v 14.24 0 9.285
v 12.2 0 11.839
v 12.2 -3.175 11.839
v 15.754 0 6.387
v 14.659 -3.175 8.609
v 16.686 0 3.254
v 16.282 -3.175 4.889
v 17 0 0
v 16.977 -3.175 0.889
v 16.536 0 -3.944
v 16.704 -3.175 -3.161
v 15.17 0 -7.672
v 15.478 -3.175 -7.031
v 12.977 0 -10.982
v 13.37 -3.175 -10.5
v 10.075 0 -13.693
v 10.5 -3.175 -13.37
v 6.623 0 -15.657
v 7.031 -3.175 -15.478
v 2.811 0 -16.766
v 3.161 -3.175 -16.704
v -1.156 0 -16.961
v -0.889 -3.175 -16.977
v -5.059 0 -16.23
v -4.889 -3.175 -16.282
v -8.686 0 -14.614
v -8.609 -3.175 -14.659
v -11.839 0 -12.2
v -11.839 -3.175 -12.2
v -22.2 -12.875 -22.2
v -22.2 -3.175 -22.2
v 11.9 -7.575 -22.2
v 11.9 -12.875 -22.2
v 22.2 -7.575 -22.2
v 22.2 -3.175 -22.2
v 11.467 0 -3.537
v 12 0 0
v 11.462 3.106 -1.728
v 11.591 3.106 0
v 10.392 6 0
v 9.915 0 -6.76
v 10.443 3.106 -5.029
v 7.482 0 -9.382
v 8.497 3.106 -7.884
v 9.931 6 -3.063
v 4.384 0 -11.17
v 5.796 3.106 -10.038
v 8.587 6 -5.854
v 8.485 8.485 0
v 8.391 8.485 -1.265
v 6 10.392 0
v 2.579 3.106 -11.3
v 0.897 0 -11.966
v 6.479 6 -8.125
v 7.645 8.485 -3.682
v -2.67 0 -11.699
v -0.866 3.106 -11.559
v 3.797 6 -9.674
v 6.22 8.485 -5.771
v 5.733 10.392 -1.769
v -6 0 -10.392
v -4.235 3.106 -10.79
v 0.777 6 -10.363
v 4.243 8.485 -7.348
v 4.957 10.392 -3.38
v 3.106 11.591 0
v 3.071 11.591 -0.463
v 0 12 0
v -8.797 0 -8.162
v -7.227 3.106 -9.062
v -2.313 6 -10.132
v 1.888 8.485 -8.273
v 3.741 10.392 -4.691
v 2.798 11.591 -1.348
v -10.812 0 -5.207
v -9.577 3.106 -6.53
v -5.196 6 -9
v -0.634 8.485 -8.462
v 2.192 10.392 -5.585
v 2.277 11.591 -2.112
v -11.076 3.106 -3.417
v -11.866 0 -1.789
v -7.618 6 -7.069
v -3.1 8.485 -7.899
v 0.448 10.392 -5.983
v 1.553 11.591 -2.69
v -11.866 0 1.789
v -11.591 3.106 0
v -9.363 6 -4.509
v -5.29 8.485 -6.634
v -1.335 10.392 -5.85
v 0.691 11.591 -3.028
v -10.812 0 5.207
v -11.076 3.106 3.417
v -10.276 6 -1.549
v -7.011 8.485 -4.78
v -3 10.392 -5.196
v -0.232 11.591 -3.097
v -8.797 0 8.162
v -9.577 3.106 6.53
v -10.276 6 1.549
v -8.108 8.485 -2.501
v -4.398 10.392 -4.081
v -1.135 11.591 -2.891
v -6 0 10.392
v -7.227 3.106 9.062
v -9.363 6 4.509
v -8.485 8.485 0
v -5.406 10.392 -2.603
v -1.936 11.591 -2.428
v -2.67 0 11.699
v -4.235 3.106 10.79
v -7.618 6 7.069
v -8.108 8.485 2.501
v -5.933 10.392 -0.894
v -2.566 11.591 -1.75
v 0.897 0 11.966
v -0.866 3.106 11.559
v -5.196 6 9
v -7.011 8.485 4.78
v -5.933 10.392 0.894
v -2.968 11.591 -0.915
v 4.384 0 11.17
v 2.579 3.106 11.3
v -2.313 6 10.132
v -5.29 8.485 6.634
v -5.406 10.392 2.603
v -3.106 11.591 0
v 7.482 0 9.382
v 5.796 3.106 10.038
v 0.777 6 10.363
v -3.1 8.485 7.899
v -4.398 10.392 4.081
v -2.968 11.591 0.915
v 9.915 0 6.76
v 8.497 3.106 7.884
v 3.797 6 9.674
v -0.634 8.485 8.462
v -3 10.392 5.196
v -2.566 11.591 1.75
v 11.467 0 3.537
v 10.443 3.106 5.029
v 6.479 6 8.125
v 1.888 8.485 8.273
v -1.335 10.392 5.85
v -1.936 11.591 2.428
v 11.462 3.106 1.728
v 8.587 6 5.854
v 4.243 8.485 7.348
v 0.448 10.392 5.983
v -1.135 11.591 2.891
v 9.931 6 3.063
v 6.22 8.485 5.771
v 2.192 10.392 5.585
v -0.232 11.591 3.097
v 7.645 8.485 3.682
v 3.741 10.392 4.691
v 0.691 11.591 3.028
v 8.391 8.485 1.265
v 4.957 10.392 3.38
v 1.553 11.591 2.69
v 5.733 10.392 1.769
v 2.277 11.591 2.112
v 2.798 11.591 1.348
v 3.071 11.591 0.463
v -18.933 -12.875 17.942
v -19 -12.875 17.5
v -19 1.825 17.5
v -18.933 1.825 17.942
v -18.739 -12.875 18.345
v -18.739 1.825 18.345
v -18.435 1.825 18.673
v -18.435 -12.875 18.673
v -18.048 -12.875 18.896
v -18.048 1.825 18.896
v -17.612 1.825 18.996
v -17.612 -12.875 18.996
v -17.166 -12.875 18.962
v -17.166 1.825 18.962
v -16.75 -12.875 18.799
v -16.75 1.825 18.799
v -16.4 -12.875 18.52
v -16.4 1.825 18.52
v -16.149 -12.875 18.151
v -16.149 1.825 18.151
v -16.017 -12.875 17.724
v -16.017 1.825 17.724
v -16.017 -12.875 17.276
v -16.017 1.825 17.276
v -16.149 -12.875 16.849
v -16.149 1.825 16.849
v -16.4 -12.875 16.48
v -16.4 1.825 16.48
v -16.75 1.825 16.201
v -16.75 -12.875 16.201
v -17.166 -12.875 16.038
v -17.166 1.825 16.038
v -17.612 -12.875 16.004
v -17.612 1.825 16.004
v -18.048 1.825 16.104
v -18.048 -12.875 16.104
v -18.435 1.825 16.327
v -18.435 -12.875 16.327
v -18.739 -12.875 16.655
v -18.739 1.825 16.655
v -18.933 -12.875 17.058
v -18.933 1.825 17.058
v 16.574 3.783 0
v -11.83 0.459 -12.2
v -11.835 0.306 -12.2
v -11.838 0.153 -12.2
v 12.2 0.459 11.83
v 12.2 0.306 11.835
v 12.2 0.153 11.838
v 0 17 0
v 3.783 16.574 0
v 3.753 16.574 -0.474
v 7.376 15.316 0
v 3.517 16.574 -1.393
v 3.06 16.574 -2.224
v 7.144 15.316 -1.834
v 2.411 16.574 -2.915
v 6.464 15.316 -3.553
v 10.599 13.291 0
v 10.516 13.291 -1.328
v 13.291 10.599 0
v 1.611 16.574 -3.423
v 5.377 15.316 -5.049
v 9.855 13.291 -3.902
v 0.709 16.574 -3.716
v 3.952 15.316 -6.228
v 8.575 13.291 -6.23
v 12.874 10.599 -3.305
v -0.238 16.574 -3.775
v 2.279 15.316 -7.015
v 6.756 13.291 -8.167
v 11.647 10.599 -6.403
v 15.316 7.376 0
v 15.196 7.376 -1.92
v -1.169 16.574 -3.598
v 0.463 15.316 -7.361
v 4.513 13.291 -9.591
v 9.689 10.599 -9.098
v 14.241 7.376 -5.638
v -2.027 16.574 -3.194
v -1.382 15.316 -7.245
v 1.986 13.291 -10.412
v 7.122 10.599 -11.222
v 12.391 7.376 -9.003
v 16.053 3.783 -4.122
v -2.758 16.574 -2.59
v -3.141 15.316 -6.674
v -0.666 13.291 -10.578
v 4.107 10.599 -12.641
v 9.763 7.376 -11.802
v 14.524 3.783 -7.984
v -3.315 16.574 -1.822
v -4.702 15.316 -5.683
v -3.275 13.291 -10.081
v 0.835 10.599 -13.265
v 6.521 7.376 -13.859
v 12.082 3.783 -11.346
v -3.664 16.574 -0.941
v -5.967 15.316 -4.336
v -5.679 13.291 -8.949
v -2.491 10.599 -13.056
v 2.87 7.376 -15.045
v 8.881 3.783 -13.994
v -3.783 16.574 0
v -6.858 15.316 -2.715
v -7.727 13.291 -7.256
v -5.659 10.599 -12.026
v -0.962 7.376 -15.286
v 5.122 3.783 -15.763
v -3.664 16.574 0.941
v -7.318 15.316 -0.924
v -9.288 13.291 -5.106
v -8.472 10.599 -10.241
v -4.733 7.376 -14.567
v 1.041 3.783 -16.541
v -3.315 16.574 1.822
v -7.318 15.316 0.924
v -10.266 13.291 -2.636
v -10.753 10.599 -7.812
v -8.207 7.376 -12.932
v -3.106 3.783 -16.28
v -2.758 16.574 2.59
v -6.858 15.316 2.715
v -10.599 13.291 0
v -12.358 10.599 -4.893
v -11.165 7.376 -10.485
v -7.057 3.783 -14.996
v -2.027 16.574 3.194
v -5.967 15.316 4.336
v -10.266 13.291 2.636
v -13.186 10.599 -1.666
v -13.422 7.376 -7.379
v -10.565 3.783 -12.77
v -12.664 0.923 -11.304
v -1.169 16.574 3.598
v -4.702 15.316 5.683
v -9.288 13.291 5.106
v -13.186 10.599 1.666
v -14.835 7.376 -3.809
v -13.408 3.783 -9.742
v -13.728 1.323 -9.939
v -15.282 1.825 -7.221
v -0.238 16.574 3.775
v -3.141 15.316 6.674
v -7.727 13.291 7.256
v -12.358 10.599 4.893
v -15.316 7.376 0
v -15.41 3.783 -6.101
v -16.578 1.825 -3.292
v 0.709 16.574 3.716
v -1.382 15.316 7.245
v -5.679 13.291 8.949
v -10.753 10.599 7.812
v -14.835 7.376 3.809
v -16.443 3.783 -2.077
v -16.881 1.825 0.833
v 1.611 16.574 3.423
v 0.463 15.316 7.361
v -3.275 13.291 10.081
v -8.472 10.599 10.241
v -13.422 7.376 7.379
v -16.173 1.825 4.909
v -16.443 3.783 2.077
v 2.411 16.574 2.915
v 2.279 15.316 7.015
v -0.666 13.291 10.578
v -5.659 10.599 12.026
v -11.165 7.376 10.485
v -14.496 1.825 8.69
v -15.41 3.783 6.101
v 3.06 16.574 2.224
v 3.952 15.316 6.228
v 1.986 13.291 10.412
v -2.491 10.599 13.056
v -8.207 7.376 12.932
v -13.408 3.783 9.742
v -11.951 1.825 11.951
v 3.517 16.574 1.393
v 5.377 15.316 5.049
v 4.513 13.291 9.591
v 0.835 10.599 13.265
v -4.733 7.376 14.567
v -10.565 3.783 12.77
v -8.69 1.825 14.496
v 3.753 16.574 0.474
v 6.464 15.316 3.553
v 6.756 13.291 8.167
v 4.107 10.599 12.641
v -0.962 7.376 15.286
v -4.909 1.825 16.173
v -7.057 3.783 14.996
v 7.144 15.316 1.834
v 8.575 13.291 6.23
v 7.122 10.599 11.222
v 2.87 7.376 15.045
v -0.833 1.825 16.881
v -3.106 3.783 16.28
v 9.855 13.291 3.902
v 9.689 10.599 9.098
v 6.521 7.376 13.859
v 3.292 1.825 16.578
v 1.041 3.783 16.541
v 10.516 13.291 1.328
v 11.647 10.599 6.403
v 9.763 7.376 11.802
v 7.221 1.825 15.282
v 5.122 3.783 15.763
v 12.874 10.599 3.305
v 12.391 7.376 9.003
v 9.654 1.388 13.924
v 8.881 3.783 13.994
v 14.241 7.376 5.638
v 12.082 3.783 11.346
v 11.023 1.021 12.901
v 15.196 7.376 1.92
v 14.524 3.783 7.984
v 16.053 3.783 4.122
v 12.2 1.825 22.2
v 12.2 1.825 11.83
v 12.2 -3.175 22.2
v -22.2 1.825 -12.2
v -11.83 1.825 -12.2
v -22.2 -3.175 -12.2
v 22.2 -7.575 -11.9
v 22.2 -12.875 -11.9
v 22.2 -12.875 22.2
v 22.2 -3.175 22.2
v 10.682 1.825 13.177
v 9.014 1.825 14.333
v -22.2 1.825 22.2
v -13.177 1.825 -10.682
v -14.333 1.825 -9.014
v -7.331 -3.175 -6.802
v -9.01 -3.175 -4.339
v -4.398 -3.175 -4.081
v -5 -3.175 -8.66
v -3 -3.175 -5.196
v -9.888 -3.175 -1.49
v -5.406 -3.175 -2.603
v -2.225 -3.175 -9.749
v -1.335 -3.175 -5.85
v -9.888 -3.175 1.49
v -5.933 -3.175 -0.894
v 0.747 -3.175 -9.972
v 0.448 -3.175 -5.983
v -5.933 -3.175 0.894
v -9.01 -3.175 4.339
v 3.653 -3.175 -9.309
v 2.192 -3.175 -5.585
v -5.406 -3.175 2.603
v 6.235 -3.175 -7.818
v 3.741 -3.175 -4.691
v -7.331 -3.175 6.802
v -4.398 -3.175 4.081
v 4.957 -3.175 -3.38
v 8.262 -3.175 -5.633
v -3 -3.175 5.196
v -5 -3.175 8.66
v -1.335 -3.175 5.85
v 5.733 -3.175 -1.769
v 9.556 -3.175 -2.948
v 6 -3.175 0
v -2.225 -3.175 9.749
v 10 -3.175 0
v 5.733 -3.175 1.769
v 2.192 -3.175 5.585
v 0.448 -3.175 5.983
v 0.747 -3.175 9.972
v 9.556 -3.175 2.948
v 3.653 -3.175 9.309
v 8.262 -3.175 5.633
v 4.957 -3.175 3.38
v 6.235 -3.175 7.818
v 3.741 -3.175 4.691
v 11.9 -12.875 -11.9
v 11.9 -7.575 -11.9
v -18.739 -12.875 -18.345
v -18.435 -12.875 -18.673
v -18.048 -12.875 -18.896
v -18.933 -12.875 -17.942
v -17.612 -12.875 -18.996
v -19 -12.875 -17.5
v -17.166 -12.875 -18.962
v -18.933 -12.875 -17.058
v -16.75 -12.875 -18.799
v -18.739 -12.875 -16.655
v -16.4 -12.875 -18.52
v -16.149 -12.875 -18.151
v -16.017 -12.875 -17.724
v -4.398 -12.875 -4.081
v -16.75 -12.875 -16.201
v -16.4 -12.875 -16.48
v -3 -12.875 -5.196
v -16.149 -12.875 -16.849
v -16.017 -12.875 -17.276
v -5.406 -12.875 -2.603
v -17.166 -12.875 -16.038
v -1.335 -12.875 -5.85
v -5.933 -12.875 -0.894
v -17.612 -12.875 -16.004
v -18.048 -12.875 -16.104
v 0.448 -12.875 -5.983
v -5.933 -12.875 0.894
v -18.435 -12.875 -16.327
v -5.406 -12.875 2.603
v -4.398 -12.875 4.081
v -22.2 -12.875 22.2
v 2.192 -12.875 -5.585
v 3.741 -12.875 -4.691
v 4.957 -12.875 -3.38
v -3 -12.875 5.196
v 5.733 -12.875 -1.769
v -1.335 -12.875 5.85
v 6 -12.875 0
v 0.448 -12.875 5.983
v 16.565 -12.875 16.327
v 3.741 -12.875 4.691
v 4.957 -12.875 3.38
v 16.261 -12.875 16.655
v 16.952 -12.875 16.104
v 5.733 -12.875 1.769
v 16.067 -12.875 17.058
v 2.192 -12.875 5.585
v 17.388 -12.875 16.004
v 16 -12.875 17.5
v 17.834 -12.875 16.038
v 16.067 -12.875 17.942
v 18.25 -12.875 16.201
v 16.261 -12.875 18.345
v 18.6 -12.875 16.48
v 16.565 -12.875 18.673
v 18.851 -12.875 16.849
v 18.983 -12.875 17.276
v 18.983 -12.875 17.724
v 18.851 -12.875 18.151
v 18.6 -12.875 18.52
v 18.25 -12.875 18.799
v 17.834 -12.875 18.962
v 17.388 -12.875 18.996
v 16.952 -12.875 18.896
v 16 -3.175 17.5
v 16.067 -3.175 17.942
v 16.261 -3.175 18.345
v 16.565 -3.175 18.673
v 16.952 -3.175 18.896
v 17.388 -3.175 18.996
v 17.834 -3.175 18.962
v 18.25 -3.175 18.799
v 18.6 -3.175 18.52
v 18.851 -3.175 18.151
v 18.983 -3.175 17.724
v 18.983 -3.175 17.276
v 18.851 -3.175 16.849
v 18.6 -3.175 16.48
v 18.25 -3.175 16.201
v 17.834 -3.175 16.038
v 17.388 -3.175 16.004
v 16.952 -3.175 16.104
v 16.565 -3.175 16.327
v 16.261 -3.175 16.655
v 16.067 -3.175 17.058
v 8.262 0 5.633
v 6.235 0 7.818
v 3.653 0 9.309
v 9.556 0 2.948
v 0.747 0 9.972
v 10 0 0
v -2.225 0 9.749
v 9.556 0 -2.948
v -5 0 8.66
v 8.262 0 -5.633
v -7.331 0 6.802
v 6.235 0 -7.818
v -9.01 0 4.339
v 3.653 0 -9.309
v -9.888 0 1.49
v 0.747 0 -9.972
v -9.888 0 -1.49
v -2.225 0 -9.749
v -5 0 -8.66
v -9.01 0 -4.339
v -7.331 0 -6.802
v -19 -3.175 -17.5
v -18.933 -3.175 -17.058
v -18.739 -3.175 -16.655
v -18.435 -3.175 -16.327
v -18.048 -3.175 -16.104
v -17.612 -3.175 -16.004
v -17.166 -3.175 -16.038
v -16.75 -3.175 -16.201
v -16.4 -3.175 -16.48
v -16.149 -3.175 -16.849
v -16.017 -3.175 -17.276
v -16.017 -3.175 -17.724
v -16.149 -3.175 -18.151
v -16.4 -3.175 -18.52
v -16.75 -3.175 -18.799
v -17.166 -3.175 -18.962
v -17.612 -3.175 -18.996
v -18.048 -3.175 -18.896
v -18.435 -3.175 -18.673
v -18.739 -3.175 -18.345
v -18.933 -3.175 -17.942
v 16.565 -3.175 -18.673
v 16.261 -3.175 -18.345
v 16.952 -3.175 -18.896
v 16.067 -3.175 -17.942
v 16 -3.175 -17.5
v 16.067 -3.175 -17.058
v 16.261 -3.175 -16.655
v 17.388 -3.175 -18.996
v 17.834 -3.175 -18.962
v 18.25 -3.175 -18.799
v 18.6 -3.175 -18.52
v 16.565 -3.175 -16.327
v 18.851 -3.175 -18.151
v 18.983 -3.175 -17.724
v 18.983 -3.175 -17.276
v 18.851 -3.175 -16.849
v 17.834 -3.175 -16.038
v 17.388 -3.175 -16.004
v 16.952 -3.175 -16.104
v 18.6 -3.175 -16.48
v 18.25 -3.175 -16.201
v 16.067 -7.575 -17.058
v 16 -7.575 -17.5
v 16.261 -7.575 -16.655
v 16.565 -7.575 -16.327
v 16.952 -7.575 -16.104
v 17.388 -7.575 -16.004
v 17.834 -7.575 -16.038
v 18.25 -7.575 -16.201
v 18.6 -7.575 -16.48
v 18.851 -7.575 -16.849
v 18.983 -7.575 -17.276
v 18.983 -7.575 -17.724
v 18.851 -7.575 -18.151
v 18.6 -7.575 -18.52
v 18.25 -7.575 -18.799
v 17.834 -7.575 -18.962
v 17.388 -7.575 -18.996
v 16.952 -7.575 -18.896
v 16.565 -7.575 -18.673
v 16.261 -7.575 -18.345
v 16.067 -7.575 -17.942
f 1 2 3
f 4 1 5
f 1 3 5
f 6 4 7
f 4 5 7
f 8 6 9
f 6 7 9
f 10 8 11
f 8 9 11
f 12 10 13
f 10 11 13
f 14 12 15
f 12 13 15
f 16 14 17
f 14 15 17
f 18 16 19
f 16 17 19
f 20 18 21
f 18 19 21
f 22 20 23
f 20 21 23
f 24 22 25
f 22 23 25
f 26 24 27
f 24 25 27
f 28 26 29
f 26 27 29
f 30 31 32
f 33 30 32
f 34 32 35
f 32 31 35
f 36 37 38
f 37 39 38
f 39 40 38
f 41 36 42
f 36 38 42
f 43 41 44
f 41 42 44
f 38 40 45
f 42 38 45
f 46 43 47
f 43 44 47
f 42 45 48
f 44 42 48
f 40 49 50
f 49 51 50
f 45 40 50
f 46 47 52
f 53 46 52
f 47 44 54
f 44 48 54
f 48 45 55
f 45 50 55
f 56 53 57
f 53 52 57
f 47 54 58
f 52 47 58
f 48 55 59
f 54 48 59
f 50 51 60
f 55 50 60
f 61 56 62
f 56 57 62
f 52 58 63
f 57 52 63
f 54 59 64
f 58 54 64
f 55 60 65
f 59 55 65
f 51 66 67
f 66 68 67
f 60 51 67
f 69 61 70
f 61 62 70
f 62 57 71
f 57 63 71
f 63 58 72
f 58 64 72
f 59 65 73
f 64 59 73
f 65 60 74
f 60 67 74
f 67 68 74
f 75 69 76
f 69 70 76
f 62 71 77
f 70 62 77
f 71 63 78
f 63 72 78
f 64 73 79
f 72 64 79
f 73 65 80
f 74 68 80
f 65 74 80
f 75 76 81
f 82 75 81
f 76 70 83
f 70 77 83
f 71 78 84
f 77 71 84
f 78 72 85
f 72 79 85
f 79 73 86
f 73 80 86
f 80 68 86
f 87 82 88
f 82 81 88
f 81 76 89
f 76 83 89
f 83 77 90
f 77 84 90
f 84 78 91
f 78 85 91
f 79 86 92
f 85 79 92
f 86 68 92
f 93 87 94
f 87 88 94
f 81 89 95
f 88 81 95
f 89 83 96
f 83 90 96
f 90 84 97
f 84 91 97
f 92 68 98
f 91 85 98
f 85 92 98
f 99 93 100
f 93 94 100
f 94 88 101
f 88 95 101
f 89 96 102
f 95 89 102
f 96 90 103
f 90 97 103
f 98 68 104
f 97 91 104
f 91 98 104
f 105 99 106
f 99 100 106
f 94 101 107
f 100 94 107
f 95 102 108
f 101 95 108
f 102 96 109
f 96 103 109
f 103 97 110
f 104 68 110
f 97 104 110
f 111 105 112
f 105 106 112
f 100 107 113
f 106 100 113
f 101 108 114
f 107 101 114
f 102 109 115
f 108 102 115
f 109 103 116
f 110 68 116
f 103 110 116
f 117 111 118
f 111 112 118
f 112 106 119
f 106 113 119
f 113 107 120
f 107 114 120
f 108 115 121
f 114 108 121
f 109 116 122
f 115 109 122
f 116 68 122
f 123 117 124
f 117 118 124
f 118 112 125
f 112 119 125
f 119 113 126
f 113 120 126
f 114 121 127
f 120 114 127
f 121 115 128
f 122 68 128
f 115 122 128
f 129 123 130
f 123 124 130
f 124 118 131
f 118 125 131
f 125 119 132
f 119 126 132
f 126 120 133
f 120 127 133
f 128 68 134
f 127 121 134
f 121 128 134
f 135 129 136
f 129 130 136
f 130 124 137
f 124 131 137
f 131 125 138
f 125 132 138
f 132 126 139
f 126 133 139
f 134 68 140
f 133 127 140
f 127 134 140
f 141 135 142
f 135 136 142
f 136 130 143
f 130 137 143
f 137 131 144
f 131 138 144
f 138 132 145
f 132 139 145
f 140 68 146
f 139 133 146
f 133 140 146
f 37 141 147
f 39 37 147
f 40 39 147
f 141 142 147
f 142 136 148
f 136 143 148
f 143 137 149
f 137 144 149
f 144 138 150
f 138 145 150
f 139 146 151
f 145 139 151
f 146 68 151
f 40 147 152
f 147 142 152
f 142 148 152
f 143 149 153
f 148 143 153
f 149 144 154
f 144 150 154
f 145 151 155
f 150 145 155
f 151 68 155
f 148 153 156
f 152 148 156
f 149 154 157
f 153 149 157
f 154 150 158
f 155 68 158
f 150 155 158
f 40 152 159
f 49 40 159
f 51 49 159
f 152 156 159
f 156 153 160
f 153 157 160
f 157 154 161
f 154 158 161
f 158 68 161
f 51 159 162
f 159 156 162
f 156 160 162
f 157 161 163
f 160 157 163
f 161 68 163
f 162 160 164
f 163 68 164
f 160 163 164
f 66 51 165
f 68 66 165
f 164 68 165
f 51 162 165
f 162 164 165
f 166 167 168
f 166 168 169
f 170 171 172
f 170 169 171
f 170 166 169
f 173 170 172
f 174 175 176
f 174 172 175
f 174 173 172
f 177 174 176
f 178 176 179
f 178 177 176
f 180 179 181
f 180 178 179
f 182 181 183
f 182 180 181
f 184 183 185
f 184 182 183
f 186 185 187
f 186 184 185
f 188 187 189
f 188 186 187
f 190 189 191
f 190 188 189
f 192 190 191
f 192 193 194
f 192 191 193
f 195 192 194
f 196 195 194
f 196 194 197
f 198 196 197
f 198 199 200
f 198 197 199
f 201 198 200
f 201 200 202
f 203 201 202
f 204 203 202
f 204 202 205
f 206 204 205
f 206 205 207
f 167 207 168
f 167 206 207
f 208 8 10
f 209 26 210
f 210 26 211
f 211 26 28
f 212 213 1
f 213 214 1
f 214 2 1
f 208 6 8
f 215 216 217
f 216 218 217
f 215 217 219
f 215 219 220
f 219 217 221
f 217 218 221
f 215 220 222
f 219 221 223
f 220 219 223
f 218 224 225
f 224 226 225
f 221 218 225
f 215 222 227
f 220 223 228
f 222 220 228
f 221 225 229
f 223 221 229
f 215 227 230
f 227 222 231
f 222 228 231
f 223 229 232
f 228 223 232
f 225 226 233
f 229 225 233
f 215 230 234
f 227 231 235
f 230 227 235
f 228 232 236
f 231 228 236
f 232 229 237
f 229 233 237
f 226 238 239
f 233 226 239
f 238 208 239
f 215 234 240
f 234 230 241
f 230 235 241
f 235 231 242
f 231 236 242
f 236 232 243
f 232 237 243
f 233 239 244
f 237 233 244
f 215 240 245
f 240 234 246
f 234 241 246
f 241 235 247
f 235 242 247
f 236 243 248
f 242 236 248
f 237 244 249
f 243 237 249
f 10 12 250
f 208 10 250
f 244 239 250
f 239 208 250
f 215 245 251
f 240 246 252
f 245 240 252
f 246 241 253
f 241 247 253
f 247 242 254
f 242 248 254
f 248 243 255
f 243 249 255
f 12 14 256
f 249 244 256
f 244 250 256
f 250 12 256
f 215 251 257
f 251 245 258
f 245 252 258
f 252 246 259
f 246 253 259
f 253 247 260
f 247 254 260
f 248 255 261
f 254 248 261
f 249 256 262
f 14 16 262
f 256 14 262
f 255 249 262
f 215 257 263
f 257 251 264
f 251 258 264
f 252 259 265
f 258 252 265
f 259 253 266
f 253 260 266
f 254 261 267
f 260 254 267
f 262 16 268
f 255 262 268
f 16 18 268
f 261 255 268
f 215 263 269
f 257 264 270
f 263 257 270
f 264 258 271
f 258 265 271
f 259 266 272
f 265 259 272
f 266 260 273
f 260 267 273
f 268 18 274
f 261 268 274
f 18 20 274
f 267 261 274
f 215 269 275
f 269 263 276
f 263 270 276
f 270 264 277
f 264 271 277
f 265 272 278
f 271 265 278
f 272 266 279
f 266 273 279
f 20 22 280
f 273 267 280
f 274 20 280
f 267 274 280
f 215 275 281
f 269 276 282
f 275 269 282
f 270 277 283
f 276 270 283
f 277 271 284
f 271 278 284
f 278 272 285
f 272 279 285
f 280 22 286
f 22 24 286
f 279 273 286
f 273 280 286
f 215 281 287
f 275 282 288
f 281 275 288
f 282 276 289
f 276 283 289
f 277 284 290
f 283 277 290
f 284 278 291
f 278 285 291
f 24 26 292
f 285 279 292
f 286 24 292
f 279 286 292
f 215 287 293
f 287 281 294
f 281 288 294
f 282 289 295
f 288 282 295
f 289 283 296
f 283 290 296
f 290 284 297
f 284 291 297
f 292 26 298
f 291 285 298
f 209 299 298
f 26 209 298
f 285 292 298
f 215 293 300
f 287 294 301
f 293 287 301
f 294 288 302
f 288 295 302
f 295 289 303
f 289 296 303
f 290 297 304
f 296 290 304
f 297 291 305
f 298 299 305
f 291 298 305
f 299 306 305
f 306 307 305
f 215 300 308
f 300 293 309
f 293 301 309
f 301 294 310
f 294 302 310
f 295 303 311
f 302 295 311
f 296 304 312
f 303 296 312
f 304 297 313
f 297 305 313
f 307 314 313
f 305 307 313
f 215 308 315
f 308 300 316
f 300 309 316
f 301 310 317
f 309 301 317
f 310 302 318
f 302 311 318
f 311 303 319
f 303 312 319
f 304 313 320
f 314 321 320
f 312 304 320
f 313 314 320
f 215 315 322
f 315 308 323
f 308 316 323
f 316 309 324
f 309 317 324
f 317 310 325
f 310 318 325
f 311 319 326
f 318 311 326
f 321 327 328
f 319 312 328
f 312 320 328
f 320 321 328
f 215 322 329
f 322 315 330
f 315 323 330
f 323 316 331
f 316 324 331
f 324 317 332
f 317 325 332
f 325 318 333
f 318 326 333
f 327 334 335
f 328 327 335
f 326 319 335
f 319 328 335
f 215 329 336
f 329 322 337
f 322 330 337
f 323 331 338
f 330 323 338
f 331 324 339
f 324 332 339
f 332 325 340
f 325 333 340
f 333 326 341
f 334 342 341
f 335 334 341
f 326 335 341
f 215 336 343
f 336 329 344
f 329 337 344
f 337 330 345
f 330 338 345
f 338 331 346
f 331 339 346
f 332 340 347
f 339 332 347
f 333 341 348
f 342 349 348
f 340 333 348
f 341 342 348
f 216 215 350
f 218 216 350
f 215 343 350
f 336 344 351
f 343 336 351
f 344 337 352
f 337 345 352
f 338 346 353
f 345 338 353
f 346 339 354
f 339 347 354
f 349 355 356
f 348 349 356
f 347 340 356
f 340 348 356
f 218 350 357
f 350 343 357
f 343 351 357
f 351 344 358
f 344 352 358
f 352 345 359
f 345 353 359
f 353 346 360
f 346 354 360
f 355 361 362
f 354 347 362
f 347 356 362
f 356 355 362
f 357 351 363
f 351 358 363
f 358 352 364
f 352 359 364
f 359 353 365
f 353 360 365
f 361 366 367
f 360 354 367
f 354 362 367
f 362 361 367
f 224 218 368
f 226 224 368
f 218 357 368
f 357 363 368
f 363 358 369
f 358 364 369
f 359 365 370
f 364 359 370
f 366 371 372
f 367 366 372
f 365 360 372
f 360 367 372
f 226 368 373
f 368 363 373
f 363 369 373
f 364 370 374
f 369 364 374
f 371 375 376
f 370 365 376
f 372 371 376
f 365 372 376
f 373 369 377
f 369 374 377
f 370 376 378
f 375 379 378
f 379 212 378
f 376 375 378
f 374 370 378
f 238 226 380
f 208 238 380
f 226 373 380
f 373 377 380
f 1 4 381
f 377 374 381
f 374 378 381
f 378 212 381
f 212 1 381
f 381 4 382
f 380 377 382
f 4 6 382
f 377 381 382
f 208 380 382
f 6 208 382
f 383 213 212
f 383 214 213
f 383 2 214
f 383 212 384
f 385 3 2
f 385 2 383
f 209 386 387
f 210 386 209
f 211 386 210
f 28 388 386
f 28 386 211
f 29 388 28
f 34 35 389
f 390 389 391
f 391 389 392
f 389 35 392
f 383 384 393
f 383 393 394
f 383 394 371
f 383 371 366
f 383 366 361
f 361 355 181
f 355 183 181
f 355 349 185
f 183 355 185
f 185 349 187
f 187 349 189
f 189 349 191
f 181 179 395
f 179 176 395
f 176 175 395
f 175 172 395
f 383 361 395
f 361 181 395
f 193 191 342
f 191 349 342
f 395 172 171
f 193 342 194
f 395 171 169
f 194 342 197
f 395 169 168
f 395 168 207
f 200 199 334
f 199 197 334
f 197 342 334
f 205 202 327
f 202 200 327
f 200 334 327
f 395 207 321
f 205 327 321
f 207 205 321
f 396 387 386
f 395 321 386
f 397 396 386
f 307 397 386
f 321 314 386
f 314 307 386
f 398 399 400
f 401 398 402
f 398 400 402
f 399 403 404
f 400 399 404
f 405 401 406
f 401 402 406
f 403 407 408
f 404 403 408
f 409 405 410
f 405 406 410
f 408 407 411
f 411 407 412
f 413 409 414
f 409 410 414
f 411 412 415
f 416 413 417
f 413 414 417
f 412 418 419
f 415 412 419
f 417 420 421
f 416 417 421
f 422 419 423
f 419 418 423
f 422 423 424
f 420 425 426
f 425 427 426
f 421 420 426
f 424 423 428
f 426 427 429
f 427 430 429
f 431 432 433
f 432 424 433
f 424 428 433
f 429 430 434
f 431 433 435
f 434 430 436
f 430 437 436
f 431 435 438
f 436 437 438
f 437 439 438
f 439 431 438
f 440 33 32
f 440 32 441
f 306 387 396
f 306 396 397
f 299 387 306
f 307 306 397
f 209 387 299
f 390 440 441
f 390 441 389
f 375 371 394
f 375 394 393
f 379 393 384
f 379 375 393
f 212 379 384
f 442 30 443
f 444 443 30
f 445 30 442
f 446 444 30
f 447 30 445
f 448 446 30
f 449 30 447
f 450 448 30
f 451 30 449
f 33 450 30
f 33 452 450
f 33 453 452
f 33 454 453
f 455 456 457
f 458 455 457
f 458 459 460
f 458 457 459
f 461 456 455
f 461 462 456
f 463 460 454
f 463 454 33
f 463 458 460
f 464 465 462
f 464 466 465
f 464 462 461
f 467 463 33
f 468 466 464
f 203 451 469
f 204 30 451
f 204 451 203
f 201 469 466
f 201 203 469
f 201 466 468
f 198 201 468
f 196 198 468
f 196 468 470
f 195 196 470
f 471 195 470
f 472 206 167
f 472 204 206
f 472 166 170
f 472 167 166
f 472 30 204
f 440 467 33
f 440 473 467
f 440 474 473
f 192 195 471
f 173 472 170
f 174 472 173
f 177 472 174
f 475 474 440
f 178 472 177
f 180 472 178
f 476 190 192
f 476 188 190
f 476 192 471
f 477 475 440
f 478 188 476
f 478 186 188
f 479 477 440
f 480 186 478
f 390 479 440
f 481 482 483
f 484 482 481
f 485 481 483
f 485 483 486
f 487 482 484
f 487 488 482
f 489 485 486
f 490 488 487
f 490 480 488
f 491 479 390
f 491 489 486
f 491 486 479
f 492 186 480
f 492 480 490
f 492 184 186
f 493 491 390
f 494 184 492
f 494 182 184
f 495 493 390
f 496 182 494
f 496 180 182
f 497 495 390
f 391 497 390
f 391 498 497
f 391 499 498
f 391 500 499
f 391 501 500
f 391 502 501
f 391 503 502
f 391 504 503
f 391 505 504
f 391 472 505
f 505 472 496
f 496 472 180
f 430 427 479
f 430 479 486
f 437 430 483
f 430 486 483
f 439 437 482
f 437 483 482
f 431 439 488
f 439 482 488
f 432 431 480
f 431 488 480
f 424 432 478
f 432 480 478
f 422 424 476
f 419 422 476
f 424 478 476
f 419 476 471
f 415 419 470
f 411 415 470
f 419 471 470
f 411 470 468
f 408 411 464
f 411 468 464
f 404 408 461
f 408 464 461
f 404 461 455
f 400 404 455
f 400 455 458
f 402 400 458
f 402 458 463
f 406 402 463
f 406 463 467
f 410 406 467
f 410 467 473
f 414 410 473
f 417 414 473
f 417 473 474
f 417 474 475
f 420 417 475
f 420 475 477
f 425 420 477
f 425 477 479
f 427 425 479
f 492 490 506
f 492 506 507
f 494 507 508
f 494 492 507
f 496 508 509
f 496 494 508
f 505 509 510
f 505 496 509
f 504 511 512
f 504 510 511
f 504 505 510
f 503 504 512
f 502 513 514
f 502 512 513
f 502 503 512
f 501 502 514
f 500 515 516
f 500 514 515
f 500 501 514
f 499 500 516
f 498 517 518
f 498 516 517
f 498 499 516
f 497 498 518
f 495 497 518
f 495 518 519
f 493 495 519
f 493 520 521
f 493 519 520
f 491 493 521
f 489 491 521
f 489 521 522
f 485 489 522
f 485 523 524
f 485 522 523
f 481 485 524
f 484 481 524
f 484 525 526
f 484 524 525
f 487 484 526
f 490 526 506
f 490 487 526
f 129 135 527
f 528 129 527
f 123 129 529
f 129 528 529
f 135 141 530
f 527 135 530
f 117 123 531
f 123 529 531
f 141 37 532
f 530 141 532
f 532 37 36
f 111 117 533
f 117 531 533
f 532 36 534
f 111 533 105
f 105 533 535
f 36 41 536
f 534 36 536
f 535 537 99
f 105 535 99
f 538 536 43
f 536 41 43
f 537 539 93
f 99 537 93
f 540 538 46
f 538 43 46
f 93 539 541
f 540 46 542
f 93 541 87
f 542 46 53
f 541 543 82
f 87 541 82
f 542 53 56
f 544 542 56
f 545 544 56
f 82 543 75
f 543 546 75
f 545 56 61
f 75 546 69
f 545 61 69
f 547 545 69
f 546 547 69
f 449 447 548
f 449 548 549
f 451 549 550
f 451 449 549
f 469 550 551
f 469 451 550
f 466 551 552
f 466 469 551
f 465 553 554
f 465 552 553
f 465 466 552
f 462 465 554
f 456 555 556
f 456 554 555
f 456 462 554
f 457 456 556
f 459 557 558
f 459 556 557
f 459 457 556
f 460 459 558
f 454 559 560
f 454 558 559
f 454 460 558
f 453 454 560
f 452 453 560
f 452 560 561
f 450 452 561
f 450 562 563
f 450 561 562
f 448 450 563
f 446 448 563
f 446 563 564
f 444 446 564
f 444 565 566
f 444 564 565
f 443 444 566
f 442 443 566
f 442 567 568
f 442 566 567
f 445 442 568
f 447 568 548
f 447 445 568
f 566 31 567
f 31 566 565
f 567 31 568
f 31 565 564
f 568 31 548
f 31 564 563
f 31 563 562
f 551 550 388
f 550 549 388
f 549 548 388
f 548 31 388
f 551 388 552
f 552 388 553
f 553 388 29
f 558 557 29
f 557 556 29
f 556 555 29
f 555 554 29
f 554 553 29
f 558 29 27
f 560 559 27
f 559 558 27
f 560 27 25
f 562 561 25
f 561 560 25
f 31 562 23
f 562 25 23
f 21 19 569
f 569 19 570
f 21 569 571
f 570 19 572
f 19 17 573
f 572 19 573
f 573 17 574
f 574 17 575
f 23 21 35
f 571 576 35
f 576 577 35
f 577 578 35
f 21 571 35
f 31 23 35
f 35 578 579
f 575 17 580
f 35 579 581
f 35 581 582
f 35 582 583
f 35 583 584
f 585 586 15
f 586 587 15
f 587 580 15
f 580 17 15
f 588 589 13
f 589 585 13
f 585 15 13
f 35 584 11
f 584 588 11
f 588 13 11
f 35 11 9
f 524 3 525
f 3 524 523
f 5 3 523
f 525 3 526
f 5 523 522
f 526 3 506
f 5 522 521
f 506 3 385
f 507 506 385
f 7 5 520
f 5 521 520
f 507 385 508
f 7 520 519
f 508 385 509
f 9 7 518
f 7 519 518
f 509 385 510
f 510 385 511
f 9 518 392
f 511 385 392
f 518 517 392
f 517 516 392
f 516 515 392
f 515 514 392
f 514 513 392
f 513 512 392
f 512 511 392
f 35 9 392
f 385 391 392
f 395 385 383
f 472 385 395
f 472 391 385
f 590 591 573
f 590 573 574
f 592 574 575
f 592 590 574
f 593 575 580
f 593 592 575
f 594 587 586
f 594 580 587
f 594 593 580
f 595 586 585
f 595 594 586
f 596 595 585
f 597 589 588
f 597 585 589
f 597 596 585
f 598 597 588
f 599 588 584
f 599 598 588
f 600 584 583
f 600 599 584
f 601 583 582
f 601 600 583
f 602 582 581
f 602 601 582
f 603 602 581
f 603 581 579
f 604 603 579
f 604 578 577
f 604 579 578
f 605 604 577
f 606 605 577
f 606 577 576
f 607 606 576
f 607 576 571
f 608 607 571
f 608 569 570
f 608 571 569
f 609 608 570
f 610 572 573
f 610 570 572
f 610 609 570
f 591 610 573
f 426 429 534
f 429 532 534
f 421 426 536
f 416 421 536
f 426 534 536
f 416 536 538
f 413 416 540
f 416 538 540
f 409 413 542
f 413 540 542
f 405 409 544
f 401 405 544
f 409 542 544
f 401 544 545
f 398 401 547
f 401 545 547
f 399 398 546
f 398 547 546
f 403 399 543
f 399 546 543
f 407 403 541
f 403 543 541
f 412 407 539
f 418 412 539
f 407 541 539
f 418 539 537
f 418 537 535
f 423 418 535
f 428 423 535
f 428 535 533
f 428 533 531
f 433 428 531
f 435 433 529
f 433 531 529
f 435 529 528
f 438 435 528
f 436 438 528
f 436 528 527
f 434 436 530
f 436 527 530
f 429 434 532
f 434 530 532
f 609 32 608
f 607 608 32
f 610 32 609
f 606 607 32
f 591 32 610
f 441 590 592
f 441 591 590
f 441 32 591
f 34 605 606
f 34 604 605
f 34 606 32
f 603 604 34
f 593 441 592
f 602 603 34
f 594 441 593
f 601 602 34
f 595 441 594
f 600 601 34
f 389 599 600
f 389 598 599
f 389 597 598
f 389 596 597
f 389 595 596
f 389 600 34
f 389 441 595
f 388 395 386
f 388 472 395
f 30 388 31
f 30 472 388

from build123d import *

# Parameters (mm, degrees)
SKETCH3_W               = 44.4
SKETCH3_H               = 44.4
BOSS_EXTRUDE1_DEPTH     = 9.7
SKETCH4_W               = 10.3
SKETCH4_H               = 10.3
CUT_EXTRUDE1_DEPTH      = 5.3
SKETCH5_R               = 6
CUT_EXTRUDE2_DEPTH      = 14.3
BOSS_EXTRUDE2_DEPTH     = 5
CUT_EXTRUDE3_DEPTH      = 35.870626966
CUT_EXTRUDE3_DEPTH_BACK = 35.870626966
SKETCH7_R               = 1.5


with BuildPart() as part:
    # Sketch2 → Revolve1 (revolve)
    with BuildSketch(Plane.XY, mode=Mode.PRIVATE) as revolve1_sk:
        with BuildLine():
            Line((-10, 0), (-12, 0))
            ThreePointArc((-12, 0), (-8.485281374, 8.485281374), (0, 12))
            Line((0, 12), (0, 17))
            ThreePointArc((0, 17), (-12.02081528, 12.02081528), (-17, 0))
            Line((-17, 0), (-17, -3.175))
            Line((-17, -3.175), (-10, -3.175))
            Line((-10, -3.175), (-10, 0))
        make_face()
    revolve(revolve1_sk.sketch.rotate(Axis((0, 12, 0), (0, 1, 0)), 180), axis=Axis((0, 12, 0), (0, 1, 0)))

    # Sketch3 → Boss-Extrude1 (add)
    with BuildSketch(Plane.XZ.offset(3.175)):
        Rectangle(SKETCH3_W, SKETCH3_H)
    extrude(amount=BOSS_EXTRUDE1_DEPTH)

    # Sketch4 → Cut-Extrude1 (cut)
    with BuildSketch(Plane.XZ.offset(12.875)):
        with Locations((17.05, -17.05)):
            Rectangle(SKETCH4_W, SKETCH4_H)
    extrude(amount=-CUT_EXTRUDE1_DEPTH, mode=Mode.SUBTRACT)

    # Sketch5 → Cut-Extrude2 (cut)
    with BuildSketch(Plane.XZ.offset(12.875)):
        Circle(SKETCH5_R)
    extrude(amount=-CUT_EXTRUDE2_DEPTH, mode=Mode.SUBTRACT)

    # Sketch6 → Boss-Extrude2 (add)
    with BuildSketch(Plane(origin=(0, -3.175, 0), x_dir=(1, 0, 0), z_dir=(0, 1, 0))):
        with BuildLine():
            Line((-22.2, -22.2), (-22.2, 12.2))
            Line((-22.2, 12.2), (-11.83, 12.2))
            ThreePointArc((-11.83, 12.2), (-11.83, -11.83), (12.2, -11.83))
            Line((12.2, -11.83), (12.2, -22.2))
            Line((12.2, -22.2), (-22.2, -22.2))
        make_face()
    extrude(amount=BOSS_EXTRUDE2_DEPTH)

    # Sketch7 → Cut-Extrude3 (cut, two sides: drawn at the far end of the back side and taken through both)
    with BuildSketch(Plane(origin=(0, 1.825, 0), x_dir=(1, 0, 0), z_dir=(0, 1, 0)).offset(-CUT_EXTRUDE3_DEPTH_BACK)):
        with Locations(Location((-17.5, -17.5, 0), (0, 0, 180))):
            Circle(SKETCH7_R)
        with Locations(Location((17.5, -17.5, 0), (0, 0, 180))):
            Circle(SKETCH7_R)
        with Locations(Location((17.5, 17.5, 0), (0, 0, 180))):
            Circle(SKETCH7_R)
        with Locations(Location((-17.5, 17.5, 0), (0, 0, 180))):
            Circle(SKETCH7_R)
    extrude(amount=CUT_EXTRUDE3_DEPTH + CUT_EXTRUDE3_DEPTH_BACK, mode=Mode.SUBTRACT)


solid = part.part
